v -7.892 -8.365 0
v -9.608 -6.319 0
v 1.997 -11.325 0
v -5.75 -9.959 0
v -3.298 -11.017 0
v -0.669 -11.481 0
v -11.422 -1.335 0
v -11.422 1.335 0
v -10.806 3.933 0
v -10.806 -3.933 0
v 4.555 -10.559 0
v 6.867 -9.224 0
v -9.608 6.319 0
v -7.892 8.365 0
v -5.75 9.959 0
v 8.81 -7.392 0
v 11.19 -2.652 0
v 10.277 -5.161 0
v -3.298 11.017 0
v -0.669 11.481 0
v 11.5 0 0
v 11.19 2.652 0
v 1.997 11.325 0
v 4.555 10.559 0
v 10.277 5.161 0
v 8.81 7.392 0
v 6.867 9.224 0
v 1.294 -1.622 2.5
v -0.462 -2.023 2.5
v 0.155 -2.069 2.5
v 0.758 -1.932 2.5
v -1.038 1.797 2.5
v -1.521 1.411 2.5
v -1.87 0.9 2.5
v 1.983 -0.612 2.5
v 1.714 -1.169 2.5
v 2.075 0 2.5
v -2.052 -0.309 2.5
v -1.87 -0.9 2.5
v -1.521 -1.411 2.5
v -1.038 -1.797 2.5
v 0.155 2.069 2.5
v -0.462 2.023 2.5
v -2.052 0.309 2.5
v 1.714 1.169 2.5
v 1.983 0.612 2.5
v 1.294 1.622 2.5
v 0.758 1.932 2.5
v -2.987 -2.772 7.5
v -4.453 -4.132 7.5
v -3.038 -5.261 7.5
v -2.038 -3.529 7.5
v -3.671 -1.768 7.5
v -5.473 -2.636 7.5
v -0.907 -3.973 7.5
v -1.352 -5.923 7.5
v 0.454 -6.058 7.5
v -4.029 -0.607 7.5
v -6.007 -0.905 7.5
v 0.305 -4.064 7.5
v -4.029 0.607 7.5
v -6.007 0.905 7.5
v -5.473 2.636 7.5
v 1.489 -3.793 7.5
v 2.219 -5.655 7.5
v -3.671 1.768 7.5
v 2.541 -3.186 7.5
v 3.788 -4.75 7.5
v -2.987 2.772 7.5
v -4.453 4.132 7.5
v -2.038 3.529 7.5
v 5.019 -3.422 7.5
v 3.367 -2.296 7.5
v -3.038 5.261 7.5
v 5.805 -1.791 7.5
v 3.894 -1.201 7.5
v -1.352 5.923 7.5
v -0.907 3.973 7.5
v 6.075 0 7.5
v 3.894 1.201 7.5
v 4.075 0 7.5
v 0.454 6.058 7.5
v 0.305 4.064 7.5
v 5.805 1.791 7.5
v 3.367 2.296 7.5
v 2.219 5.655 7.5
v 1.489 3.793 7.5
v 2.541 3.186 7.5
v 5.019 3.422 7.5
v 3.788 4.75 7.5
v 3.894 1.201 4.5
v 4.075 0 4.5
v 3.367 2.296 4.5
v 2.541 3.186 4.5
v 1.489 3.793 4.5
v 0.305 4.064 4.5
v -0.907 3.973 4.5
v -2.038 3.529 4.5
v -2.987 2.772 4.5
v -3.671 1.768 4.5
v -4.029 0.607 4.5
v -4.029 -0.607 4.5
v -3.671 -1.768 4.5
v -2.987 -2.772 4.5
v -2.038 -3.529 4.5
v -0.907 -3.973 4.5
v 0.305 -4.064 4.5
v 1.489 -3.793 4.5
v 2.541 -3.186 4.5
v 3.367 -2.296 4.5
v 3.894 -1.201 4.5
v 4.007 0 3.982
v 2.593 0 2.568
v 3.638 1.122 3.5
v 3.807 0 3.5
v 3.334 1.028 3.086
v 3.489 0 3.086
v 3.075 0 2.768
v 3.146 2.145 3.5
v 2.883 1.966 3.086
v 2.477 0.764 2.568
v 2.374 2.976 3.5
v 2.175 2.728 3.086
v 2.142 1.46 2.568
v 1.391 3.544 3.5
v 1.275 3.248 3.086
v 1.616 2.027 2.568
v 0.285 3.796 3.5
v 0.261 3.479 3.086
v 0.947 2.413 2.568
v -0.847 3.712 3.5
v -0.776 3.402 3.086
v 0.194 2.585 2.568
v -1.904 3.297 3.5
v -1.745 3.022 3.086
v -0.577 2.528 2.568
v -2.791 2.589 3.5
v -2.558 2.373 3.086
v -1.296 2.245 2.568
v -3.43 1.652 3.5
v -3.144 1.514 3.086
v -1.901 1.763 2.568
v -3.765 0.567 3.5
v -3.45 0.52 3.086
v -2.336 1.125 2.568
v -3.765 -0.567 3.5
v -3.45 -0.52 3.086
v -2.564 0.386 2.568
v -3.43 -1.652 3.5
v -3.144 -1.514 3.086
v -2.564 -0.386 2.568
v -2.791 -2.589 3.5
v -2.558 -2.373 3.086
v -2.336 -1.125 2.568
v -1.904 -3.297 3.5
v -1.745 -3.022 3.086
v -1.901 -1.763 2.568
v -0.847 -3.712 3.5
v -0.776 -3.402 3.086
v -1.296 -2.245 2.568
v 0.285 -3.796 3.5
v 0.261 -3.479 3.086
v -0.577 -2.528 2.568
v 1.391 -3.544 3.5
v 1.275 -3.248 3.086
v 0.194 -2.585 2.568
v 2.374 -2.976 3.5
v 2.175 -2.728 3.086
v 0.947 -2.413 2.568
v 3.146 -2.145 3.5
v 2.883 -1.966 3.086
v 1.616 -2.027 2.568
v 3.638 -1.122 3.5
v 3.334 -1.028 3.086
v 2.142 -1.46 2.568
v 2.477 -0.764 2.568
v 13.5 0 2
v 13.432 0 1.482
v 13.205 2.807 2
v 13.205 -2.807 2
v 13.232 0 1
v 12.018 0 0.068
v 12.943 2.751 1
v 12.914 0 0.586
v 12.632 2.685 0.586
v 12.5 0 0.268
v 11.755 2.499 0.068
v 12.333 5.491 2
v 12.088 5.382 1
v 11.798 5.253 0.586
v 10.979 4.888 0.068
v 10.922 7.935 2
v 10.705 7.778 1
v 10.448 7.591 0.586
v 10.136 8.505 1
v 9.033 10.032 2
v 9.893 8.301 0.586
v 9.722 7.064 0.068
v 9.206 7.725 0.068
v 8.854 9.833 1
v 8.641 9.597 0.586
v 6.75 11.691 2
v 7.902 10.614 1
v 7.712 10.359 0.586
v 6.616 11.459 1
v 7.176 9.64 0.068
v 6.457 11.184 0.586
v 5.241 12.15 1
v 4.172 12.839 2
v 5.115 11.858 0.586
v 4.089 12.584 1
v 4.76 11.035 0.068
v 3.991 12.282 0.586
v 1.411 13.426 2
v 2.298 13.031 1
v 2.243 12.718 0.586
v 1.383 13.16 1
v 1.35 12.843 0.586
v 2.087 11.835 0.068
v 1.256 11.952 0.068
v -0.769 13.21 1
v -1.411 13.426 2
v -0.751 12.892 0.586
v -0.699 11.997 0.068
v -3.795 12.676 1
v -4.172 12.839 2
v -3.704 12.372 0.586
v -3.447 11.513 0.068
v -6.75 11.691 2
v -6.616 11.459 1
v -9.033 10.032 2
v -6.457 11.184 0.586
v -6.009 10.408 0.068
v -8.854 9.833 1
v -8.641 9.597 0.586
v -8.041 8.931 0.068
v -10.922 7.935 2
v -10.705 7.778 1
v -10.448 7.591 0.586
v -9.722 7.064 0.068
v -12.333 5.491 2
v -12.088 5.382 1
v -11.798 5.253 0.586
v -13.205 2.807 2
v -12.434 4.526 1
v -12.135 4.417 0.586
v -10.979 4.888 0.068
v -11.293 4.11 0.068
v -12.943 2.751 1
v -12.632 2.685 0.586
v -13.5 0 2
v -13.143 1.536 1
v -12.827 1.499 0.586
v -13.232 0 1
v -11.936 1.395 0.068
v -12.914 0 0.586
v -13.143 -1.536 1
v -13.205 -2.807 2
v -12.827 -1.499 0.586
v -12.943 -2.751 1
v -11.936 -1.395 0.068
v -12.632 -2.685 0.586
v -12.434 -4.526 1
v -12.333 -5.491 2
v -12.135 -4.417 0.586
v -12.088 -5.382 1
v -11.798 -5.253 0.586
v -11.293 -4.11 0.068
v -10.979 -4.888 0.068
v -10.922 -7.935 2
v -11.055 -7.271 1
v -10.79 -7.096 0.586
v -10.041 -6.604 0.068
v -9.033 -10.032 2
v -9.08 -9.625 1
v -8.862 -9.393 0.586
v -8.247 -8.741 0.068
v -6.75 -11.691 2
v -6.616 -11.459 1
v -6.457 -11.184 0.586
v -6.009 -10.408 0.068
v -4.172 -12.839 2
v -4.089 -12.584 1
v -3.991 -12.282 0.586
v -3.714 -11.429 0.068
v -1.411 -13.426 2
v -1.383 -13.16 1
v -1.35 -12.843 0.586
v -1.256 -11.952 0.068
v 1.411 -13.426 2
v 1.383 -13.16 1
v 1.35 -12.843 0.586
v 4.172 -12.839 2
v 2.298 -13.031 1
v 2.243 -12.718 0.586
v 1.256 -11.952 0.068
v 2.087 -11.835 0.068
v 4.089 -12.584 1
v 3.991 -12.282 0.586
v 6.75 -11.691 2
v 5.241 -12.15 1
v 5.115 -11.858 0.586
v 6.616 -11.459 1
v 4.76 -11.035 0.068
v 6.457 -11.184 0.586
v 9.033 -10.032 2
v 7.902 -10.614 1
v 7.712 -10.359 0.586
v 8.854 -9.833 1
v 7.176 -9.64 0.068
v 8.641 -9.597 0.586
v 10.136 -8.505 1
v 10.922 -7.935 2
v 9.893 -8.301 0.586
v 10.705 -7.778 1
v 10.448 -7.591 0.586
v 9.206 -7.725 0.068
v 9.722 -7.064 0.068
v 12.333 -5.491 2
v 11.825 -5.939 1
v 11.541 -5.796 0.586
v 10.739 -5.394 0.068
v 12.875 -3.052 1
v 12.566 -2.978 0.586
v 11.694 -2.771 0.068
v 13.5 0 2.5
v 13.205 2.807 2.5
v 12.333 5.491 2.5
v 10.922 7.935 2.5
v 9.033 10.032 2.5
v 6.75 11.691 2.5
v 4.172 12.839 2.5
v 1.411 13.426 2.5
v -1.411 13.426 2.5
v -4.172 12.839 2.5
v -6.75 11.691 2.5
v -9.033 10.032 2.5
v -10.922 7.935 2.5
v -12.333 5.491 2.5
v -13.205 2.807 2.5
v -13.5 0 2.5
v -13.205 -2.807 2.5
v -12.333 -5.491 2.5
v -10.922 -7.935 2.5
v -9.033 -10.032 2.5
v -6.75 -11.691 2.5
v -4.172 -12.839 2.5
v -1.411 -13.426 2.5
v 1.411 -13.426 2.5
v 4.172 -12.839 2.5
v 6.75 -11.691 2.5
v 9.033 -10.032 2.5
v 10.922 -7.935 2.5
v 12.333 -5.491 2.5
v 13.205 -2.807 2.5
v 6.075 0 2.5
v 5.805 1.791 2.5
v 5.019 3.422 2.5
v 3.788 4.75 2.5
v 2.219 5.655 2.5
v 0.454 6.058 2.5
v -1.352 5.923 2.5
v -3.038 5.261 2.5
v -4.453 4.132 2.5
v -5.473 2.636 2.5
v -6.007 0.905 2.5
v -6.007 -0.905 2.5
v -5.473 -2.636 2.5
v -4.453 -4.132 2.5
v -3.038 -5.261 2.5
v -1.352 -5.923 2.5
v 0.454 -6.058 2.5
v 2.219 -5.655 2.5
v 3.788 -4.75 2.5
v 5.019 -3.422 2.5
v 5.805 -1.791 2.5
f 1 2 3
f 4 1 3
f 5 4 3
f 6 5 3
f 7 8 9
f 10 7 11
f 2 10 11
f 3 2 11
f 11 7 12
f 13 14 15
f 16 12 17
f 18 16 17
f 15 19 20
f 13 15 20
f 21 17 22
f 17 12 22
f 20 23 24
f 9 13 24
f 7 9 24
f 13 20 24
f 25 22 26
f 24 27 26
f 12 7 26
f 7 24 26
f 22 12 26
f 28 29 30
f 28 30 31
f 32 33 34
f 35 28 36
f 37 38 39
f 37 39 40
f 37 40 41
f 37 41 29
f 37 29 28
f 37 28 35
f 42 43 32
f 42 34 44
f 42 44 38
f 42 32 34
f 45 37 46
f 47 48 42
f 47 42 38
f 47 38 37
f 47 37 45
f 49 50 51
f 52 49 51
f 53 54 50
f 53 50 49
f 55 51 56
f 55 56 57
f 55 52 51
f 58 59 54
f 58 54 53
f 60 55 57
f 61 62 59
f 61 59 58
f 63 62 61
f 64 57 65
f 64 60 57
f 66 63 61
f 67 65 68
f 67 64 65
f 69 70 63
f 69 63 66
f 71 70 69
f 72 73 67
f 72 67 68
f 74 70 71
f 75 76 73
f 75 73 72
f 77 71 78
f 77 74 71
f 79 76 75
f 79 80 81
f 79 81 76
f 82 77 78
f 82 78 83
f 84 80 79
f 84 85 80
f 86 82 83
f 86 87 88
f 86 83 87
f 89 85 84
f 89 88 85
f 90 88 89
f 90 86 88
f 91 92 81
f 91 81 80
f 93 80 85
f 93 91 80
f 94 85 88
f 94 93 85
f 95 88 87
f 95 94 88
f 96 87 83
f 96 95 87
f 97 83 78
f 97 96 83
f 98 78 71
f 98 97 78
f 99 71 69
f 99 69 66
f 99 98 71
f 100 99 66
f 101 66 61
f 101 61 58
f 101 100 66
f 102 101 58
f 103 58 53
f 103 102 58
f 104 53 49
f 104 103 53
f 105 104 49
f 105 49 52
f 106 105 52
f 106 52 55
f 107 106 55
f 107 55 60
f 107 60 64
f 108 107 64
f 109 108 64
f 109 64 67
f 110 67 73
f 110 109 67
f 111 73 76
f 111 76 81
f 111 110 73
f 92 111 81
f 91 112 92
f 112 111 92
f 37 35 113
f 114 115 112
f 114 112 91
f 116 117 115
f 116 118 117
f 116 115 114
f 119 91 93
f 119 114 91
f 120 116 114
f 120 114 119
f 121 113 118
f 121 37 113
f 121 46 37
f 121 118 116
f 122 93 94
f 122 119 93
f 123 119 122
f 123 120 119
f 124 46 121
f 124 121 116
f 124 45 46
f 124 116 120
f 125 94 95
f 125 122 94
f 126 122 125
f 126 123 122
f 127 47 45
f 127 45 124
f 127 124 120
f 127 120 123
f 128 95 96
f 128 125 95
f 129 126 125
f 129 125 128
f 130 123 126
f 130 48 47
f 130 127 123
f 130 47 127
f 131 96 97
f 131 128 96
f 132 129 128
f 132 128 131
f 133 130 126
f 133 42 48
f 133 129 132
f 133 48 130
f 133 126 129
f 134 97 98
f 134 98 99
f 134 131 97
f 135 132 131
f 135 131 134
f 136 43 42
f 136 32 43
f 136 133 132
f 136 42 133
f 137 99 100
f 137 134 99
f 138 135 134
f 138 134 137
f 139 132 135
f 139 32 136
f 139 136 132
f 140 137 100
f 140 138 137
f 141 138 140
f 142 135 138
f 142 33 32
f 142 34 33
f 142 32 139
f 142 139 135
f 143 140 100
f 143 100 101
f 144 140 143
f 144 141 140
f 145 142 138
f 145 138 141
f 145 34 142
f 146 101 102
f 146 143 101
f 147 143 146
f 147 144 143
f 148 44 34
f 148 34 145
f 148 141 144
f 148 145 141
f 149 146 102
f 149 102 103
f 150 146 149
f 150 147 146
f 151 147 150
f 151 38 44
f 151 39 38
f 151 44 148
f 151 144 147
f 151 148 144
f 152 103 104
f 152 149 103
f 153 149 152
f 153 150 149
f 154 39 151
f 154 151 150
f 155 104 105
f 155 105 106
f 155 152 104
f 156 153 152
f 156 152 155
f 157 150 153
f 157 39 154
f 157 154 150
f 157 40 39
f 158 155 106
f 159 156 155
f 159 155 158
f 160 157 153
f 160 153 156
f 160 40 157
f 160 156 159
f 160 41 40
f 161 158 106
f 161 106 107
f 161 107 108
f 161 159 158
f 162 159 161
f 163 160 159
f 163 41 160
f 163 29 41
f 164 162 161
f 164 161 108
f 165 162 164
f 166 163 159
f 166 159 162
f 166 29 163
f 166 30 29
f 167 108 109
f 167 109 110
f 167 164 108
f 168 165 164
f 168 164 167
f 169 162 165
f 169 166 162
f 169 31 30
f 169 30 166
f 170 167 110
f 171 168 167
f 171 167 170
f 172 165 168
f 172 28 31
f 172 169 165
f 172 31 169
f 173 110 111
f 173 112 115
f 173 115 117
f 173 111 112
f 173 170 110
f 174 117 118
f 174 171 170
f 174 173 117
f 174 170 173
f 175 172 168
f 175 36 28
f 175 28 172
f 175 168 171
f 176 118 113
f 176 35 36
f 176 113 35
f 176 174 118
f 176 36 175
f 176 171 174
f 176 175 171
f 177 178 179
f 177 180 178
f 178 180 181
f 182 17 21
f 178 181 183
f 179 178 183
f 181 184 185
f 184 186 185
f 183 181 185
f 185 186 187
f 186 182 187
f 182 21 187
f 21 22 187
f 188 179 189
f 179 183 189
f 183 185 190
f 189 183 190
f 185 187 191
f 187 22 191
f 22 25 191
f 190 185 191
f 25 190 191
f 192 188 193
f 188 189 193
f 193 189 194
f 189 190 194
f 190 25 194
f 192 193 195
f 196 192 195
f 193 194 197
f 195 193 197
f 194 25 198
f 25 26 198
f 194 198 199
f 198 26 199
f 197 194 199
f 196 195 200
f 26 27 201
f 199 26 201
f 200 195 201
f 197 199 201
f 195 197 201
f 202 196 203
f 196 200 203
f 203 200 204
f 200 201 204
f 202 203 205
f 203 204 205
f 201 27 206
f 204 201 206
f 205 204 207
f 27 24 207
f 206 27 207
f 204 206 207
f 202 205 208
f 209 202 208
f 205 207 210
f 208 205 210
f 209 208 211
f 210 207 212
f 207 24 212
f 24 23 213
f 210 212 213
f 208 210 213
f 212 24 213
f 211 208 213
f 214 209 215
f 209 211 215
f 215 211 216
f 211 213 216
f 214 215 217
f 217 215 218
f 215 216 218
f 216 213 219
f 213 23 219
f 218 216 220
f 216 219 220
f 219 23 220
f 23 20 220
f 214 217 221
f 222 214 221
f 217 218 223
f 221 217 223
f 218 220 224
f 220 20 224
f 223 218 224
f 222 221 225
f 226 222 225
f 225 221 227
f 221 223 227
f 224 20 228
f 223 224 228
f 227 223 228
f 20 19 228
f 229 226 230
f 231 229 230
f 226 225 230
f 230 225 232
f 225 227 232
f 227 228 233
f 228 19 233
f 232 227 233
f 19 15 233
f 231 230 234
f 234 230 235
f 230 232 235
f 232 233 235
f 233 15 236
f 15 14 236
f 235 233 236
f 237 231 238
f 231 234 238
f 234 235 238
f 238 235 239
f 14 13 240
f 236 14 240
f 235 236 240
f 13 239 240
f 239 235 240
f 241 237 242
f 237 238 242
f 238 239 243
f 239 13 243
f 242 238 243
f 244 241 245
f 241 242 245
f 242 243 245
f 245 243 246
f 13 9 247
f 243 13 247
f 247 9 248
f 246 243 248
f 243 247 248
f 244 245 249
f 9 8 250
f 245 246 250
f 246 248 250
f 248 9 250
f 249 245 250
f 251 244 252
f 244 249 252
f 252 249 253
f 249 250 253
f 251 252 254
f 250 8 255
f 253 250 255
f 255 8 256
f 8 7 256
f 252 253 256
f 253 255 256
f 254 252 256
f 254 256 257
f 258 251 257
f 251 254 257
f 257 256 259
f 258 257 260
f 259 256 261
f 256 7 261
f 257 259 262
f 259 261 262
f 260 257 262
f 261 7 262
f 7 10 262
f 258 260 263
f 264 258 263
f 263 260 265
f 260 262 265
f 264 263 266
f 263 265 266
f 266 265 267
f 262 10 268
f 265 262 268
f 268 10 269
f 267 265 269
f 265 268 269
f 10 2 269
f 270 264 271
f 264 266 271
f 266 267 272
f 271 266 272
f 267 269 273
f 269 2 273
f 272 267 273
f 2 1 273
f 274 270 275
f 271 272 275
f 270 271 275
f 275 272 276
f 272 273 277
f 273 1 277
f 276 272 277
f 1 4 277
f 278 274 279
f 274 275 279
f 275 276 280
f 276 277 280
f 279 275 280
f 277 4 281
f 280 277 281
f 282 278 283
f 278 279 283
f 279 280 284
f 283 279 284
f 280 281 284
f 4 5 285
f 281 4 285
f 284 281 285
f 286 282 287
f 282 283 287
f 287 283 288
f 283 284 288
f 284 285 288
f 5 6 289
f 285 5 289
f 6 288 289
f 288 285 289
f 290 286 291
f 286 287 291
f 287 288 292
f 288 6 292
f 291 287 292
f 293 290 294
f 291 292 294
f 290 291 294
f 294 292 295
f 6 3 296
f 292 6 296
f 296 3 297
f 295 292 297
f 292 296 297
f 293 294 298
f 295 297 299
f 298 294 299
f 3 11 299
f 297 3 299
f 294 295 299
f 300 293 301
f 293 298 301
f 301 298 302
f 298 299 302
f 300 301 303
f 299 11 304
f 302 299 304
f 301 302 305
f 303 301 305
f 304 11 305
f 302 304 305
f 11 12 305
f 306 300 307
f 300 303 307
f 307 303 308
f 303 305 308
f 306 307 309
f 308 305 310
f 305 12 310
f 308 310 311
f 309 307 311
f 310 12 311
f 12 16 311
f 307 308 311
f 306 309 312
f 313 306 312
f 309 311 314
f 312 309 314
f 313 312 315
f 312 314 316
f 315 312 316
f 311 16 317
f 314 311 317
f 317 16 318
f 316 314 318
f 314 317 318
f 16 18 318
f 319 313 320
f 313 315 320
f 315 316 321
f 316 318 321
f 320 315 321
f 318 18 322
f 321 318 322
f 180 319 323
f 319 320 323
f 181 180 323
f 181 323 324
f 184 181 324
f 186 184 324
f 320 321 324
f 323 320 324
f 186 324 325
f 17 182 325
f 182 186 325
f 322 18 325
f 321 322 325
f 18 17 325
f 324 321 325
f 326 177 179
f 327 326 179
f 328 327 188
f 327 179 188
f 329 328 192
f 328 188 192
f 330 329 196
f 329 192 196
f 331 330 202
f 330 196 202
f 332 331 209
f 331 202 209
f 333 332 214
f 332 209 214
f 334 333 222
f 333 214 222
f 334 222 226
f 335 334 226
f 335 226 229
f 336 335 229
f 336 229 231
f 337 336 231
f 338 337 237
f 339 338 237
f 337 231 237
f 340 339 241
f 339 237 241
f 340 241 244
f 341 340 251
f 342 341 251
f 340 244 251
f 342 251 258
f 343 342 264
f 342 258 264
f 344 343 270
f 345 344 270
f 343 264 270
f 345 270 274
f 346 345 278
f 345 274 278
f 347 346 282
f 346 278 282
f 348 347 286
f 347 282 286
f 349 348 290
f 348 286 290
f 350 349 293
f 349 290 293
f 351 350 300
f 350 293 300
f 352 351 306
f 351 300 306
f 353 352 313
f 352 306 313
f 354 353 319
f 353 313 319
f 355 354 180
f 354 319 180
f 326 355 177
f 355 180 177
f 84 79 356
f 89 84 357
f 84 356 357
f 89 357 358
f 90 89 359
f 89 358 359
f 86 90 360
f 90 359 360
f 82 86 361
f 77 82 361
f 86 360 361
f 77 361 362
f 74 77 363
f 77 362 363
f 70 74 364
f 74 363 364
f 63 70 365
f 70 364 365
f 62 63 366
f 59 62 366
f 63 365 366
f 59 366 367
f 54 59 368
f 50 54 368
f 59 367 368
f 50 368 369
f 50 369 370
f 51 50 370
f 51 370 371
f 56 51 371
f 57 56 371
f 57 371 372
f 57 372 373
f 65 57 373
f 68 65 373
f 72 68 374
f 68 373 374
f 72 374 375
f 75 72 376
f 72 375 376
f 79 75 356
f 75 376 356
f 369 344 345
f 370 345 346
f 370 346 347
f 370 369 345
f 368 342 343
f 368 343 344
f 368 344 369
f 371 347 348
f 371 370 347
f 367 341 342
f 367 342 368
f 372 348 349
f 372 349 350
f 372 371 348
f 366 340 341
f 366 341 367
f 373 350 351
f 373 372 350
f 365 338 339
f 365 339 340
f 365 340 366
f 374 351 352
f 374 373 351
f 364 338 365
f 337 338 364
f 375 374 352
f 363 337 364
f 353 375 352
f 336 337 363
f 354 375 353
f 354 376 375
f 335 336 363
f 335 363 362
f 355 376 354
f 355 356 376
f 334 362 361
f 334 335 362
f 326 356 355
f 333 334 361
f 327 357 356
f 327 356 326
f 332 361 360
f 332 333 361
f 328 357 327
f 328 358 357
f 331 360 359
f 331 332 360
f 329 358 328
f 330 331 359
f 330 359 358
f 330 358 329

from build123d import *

# Parameters (mm, degrees)
F0_R     = 13.5
F1_DEPTH = 2.5
F2_R     = 6.075
F2_R_2   = 4.075
F3_DEPTH = 5
F4_R     = 2
F5_R     = 2


with BuildPart() as f1:
    # F0 (on Top) → F1 (new body)
    with BuildSketch(Plane.XY):
        Circle(F0_R)
    extrude(amount=F1_DEPTH)

    # F2 (on face) → F3 (join)
    with BuildSketch(Plane.XY.offset(2.5)):
        Circle(F2_R)
        Circle(F2_R_2, mode=Mode.SUBTRACT)
    extrude(amount=F3_DEPTH)

    # F4
    f4_edges = [f1.edges().sort_by_distance(p)[0] for p in [
        (-4.075, 0, 2.5),
    ]]
    fillet(f4_edges, radius=F4_R)

    # F5
    f5_edges = [f1.edges().sort_by_distance(p)[0] for p in [
        (-13.5, 0, 0),
    ]]
    fillet(f5_edges, radius=F5_R)


solid = f1.part
